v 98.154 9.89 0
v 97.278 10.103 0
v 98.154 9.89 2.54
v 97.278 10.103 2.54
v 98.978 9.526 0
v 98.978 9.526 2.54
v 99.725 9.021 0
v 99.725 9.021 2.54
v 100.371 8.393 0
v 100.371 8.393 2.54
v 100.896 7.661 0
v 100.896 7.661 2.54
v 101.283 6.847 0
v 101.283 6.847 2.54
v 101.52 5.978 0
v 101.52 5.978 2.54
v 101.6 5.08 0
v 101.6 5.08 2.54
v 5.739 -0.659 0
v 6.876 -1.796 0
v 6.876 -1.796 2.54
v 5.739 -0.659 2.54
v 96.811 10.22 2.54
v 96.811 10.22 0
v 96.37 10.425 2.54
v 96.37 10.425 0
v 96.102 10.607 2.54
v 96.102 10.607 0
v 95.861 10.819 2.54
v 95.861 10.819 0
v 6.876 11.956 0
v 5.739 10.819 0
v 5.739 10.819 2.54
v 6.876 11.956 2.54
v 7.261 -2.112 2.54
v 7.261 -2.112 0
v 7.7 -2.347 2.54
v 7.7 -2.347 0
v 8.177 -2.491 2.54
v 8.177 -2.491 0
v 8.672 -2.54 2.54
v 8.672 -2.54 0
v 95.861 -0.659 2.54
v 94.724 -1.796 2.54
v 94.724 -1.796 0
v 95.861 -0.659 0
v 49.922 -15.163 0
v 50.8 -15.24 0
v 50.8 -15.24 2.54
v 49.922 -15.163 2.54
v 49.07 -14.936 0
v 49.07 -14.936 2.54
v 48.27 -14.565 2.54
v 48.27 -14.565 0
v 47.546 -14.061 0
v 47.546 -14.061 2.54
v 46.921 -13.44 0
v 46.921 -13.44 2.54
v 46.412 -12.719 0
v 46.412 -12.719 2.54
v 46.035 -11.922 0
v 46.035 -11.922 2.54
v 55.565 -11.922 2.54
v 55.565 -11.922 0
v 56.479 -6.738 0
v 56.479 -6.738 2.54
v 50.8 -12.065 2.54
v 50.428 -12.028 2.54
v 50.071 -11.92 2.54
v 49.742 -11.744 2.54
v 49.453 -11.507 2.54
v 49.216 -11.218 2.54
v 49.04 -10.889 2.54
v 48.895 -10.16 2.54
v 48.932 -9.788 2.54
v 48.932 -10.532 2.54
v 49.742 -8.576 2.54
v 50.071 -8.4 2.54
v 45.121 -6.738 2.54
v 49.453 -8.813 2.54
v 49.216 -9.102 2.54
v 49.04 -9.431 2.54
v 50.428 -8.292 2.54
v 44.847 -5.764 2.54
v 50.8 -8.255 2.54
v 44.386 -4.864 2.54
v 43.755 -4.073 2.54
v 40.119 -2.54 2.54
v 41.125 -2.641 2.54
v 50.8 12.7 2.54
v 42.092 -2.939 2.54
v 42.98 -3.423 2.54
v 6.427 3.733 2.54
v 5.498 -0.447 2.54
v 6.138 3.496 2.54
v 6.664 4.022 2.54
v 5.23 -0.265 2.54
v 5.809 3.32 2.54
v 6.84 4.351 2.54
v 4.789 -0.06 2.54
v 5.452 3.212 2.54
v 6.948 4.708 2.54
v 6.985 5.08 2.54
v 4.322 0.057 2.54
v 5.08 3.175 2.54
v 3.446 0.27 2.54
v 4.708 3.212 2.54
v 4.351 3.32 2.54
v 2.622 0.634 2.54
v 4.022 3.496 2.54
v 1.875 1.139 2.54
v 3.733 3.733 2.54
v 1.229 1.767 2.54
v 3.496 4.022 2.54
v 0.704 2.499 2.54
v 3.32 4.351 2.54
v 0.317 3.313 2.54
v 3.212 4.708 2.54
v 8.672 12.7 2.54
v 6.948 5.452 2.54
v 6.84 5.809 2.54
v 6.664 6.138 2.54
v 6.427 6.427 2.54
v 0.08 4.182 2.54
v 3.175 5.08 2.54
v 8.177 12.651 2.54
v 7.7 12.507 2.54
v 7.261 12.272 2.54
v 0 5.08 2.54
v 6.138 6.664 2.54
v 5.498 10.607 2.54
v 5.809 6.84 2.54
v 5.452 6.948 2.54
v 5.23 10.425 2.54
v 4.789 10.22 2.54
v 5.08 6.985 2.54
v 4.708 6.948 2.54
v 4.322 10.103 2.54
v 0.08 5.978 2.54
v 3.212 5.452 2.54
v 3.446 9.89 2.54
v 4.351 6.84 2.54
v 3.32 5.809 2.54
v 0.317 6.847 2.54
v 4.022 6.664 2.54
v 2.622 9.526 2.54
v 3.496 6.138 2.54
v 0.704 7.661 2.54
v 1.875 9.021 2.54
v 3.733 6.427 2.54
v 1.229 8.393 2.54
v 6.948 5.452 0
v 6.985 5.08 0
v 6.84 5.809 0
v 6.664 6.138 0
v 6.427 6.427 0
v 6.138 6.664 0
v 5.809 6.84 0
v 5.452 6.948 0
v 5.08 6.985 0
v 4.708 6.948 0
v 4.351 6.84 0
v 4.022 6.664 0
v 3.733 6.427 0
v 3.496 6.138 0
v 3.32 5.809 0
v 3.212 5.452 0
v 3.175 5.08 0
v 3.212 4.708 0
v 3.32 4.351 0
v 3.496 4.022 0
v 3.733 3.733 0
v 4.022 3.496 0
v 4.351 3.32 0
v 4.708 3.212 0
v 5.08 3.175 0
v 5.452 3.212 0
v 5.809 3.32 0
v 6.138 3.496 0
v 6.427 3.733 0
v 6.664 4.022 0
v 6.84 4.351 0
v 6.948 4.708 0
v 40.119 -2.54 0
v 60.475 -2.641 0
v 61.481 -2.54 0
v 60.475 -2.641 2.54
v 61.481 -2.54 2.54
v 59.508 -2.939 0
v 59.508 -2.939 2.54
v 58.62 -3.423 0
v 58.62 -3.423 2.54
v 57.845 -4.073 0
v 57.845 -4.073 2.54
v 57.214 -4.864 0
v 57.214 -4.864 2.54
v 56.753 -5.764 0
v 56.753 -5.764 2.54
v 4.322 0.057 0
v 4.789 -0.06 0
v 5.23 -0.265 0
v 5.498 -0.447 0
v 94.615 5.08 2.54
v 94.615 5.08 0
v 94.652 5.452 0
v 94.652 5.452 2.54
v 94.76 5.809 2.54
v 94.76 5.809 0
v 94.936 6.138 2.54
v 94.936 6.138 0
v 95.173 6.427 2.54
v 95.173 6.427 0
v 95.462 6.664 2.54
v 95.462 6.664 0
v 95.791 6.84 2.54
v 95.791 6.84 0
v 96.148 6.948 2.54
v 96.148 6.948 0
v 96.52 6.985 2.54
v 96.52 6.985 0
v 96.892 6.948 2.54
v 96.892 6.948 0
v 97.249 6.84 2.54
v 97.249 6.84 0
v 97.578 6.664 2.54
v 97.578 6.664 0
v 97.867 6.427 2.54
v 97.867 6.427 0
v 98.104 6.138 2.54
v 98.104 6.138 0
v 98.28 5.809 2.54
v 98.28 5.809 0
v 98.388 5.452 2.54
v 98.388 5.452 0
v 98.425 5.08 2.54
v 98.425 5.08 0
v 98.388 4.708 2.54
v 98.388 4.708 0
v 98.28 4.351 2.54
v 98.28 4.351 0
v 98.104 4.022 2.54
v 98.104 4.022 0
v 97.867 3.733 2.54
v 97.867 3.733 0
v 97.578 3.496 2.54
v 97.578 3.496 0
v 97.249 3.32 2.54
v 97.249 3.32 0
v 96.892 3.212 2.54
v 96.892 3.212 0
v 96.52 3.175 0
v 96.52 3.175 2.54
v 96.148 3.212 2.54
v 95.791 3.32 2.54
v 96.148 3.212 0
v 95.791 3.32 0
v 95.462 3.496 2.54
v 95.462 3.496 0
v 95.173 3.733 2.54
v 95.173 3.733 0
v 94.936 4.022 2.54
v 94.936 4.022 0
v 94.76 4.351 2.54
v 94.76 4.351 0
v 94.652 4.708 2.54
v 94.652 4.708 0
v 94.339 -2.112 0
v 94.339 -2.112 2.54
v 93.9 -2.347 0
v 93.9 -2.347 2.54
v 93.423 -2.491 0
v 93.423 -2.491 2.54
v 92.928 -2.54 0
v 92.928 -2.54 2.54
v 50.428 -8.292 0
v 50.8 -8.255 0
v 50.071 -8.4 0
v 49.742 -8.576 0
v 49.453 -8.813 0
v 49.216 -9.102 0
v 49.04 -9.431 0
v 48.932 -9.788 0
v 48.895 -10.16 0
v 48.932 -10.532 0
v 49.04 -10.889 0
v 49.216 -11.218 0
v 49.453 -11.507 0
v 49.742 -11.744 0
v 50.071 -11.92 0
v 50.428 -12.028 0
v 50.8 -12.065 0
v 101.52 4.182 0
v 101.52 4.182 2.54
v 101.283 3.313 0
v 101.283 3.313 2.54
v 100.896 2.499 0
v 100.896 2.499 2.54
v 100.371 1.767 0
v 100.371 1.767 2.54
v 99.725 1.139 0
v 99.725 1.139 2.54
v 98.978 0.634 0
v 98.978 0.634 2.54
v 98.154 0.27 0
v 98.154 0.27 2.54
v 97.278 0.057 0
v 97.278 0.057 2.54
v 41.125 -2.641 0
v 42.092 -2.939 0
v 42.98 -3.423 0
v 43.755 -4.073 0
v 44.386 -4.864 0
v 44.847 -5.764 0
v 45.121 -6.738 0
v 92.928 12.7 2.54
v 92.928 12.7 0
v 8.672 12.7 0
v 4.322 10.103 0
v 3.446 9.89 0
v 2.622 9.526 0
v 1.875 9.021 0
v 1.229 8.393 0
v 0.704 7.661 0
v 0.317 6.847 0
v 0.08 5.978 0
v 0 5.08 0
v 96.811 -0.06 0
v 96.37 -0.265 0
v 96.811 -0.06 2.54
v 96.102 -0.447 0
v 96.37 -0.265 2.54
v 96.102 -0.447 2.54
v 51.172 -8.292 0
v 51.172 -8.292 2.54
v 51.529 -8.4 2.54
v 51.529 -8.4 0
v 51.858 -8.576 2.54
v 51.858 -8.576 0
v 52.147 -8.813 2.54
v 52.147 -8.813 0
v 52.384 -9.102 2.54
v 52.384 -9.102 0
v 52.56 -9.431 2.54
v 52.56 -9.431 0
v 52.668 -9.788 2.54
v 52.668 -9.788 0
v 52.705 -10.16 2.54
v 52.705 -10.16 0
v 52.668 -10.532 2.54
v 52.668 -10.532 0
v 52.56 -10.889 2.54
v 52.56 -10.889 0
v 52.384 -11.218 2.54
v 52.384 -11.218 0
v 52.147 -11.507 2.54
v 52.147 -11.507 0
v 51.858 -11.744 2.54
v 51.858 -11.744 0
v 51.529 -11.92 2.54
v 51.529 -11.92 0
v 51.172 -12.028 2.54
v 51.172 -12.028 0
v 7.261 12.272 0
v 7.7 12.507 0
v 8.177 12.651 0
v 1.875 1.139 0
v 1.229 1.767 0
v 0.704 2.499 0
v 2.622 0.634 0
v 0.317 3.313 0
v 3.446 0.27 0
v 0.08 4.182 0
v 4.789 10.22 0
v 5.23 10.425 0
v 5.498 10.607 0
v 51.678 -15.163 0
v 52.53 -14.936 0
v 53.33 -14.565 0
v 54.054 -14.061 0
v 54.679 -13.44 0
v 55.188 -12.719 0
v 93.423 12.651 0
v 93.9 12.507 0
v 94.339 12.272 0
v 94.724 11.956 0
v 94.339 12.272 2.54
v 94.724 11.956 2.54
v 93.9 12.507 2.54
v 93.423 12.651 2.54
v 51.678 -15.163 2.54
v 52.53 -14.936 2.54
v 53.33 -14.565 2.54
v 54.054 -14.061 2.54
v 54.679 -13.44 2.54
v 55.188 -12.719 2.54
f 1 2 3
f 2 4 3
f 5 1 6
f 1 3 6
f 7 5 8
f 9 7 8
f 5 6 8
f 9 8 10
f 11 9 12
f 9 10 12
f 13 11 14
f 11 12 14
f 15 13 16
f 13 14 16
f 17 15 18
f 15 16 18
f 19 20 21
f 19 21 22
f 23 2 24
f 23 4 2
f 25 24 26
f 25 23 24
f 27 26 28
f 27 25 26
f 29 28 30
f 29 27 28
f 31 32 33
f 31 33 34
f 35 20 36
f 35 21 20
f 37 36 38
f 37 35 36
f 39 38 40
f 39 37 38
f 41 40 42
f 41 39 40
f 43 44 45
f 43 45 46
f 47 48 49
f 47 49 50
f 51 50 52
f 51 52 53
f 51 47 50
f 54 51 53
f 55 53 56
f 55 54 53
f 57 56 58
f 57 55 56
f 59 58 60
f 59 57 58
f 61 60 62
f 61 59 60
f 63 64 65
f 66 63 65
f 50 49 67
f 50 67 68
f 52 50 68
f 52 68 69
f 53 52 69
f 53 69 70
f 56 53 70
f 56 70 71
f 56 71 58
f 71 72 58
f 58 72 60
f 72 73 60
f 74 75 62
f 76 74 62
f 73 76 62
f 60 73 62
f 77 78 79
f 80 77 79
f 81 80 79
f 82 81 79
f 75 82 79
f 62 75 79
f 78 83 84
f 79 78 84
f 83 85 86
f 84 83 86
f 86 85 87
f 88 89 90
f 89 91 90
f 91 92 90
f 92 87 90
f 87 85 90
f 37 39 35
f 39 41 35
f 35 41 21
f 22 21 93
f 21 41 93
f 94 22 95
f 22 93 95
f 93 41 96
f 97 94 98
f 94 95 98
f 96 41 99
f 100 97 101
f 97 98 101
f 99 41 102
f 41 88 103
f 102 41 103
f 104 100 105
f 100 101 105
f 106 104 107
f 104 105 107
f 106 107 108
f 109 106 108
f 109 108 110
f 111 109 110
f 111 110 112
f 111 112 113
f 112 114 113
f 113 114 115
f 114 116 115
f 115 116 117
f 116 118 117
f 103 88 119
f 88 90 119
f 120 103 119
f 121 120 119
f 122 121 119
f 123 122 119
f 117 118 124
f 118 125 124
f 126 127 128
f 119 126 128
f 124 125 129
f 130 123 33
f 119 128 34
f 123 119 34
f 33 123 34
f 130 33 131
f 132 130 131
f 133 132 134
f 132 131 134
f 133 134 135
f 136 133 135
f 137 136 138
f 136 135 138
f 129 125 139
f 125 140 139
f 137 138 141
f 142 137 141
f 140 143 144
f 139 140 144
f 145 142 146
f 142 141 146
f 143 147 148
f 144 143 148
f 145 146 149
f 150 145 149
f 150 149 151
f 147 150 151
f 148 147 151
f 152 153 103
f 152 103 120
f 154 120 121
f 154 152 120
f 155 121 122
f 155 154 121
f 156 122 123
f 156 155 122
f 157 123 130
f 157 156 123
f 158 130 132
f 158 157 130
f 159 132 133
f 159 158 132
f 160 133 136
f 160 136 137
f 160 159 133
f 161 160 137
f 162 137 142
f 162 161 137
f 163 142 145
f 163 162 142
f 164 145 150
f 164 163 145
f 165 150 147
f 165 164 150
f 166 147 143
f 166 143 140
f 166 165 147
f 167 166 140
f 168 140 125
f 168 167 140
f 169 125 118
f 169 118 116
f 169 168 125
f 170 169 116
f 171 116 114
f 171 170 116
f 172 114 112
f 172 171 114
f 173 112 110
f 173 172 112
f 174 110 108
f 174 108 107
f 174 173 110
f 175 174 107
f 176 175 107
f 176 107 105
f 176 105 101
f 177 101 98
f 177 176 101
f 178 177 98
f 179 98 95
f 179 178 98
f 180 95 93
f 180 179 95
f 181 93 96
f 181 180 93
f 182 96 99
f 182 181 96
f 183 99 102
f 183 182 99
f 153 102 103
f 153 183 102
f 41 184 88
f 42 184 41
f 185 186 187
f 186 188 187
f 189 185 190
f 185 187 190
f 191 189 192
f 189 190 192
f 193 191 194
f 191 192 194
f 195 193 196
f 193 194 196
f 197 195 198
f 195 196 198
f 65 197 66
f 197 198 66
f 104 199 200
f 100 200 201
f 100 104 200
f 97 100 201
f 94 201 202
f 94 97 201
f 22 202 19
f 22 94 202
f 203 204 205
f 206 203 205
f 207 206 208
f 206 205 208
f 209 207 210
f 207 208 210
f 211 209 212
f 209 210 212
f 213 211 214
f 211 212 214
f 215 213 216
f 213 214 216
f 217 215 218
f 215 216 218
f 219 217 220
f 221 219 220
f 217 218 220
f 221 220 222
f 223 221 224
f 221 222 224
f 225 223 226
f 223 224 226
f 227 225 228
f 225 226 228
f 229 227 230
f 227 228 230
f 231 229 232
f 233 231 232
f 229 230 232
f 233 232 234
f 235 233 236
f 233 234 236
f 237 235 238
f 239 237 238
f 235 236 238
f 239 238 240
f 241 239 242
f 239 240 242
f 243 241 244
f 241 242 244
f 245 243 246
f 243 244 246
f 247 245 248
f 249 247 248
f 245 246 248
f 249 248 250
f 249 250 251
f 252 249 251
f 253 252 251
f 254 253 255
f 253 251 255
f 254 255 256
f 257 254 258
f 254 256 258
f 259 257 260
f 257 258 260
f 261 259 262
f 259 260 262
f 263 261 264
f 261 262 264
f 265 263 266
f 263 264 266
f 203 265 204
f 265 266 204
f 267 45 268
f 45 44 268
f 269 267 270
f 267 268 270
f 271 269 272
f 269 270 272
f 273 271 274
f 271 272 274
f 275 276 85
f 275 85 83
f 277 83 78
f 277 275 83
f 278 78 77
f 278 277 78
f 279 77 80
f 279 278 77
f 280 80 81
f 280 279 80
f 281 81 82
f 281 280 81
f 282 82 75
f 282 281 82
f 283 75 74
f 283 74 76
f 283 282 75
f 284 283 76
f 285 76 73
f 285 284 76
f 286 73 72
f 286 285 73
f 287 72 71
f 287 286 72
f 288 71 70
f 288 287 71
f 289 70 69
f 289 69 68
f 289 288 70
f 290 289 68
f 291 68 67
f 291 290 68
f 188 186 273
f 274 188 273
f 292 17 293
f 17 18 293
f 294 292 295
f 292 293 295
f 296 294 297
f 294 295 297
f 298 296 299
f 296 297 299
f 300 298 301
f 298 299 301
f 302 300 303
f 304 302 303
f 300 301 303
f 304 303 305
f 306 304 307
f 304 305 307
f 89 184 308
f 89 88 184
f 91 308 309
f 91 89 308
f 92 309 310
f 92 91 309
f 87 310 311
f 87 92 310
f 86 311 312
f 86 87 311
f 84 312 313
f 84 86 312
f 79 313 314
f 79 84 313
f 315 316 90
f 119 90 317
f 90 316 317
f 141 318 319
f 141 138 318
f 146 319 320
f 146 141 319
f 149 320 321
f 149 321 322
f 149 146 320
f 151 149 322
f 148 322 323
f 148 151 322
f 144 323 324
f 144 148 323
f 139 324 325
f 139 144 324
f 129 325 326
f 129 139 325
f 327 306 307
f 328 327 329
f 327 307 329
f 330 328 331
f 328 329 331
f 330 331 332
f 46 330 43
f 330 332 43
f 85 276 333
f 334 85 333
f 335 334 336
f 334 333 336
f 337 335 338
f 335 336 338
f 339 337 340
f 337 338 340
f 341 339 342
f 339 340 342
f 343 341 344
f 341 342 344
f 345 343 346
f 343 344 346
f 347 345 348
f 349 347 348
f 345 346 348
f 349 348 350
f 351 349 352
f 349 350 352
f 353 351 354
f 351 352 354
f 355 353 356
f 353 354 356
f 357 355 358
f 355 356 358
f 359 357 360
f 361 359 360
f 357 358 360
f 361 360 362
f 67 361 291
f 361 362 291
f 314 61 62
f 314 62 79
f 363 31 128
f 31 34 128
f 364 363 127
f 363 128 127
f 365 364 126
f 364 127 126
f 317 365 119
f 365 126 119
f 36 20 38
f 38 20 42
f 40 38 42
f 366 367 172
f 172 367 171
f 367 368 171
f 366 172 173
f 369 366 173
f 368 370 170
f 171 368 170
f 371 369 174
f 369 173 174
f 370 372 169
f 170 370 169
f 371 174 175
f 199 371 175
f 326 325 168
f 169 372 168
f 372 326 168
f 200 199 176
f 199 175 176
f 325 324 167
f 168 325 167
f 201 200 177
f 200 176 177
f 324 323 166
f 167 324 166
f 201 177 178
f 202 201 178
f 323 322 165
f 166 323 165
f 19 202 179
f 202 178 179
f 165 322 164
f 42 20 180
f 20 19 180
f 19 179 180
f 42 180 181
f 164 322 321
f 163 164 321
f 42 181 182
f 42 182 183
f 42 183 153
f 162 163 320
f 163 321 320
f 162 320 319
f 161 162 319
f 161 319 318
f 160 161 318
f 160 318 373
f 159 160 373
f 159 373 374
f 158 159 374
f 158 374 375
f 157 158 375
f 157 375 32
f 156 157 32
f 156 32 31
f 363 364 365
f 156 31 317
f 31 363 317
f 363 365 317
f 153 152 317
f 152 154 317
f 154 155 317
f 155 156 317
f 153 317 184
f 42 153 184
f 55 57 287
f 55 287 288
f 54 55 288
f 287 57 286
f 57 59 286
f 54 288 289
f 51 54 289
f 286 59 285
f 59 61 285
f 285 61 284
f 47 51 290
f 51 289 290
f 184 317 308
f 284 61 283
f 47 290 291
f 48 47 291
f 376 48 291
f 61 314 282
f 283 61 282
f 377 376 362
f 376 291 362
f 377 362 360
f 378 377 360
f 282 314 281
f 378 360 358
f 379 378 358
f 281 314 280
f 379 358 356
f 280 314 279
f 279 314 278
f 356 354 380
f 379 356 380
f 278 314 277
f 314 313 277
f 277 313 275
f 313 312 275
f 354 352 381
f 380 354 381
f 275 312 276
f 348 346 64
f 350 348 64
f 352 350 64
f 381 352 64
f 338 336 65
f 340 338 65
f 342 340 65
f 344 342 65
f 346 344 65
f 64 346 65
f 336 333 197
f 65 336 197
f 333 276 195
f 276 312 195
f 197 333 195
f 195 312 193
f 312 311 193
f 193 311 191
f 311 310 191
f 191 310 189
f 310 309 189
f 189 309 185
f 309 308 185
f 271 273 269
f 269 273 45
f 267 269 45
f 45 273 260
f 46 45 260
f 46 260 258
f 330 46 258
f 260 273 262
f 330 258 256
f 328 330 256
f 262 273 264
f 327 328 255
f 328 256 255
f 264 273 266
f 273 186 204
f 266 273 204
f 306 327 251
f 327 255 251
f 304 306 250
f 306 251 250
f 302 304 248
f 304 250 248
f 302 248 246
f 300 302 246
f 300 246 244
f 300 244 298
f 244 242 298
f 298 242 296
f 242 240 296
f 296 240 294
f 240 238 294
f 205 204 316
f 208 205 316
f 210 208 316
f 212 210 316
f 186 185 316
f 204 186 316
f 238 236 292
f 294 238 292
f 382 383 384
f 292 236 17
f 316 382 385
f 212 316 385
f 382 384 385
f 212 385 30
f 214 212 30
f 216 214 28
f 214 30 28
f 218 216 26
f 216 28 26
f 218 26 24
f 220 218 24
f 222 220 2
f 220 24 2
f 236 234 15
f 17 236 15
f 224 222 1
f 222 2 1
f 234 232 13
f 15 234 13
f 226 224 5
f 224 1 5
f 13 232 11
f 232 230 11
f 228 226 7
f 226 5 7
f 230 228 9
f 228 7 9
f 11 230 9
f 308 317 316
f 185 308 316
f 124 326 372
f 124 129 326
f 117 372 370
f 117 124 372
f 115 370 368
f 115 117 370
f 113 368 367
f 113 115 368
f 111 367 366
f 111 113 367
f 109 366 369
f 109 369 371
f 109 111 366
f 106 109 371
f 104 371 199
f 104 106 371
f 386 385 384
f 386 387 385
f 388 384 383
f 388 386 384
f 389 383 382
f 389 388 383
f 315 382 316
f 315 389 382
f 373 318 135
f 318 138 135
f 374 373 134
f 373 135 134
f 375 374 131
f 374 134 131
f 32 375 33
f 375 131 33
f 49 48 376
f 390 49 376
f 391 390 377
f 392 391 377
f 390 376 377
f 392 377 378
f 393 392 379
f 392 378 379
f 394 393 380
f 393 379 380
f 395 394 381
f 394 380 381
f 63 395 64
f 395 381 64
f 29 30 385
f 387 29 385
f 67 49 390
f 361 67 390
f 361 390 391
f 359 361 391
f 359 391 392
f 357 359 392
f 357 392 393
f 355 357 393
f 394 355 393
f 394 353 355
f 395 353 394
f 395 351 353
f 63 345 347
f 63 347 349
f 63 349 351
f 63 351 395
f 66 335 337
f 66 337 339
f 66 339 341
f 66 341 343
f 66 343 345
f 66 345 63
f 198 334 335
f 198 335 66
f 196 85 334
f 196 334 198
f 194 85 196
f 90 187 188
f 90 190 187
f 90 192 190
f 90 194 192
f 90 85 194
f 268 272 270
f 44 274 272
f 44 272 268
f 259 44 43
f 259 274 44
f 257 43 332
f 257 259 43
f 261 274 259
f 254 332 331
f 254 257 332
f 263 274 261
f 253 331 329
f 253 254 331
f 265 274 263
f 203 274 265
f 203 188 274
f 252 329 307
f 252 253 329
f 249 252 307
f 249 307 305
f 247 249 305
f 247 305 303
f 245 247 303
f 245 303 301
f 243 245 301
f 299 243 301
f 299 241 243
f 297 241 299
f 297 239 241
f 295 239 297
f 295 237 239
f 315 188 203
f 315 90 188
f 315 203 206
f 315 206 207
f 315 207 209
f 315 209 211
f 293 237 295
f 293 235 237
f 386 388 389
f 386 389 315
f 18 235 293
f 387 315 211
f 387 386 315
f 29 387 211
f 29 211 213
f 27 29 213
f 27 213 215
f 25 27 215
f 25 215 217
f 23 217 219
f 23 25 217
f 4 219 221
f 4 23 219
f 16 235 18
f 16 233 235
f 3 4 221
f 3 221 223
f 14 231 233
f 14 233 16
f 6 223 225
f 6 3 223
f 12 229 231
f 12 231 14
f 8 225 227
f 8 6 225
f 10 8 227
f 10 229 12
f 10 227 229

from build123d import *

# Parameters (mm, degrees)
SKETCH1_R           = 1.905
BOSS_EXTRUDE1_DEPTH = 2.54
FILLET5_R           = 5.08
FILLET6_R           = 2.54


with BuildPart() as part:
    # Sketch1 → Boss-Extrude1 (new body)
    with BuildSketch(Plane.XY):
        with BuildLine():
            Line((5.08, 10.16), (7.62, 12.7))
            Line((7.62, 12.7), (50.8, 12.7))
            Line((50.8, 12.7), (50.8, -2.54))
            Line((50.8, -2.54), (50.8, -8.255))
            ThreePointArc((50.8, -8.255), (48.895, -10.16), (50.8, -12.065))
            Line((50.8, -12.065), (50.8, -15.24))
            ThreePointArc((50.8, -15.24), (47.896976236, -14.328795153), (46.035389215, -11.922068121))
            Line((46.035389215, -11.922068121), (44.38107747, -2.54))
            Line((44.38107747, -2.54), (7.62, -2.54))
            Line((7.62, -2.54), (5.08, 0))
            Line((5.08, 0), (0, 0))
            Line((0, 0), (0, 10.16))
            Line((0, 10.16), (5.08, 10.16))
        make_face()
        with Locations((5.08, 5.08)):
            Circle(SKETCH1_R, mode=Mode.SUBTRACT)
    extrude(amount=BOSS_EXTRUDE1_DEPTH)

    # Fillet5
    fillet5_edges = [part.edges().sort_by_distance(p)[0] for p in [
        (44.38107747, -2.54, 1.27),
        (0, 0, 1.27),
        (0, 10.16, 1.27),
    ]]
    fillet(fillet5_edges, radius=FILLET5_R - 0.0001)  # a hair under: the kernel refuses the full size

    # Fillet6
    fillet6_edges = [part.edges().sort_by_distance(p)[0] for p in [
        (5.08, 10.16, 1.27),
        (7.62, 12.7, 1.27),
        (7.62, -2.54, 1.27),
        (5.08, 0, 1.27),
    ]]
    fillet(fillet6_edges, radius=FILLET6_R)

    # Mirror5: part across plane


with BuildPart() as part_1:
    add(part.part)
    add(part.part.mirror(Plane(origin=(50.8, -2.54, 2.54), x_dir=(0, 0, 1), z_dir=(-1, 0, 0))))


solid = part_1.part
